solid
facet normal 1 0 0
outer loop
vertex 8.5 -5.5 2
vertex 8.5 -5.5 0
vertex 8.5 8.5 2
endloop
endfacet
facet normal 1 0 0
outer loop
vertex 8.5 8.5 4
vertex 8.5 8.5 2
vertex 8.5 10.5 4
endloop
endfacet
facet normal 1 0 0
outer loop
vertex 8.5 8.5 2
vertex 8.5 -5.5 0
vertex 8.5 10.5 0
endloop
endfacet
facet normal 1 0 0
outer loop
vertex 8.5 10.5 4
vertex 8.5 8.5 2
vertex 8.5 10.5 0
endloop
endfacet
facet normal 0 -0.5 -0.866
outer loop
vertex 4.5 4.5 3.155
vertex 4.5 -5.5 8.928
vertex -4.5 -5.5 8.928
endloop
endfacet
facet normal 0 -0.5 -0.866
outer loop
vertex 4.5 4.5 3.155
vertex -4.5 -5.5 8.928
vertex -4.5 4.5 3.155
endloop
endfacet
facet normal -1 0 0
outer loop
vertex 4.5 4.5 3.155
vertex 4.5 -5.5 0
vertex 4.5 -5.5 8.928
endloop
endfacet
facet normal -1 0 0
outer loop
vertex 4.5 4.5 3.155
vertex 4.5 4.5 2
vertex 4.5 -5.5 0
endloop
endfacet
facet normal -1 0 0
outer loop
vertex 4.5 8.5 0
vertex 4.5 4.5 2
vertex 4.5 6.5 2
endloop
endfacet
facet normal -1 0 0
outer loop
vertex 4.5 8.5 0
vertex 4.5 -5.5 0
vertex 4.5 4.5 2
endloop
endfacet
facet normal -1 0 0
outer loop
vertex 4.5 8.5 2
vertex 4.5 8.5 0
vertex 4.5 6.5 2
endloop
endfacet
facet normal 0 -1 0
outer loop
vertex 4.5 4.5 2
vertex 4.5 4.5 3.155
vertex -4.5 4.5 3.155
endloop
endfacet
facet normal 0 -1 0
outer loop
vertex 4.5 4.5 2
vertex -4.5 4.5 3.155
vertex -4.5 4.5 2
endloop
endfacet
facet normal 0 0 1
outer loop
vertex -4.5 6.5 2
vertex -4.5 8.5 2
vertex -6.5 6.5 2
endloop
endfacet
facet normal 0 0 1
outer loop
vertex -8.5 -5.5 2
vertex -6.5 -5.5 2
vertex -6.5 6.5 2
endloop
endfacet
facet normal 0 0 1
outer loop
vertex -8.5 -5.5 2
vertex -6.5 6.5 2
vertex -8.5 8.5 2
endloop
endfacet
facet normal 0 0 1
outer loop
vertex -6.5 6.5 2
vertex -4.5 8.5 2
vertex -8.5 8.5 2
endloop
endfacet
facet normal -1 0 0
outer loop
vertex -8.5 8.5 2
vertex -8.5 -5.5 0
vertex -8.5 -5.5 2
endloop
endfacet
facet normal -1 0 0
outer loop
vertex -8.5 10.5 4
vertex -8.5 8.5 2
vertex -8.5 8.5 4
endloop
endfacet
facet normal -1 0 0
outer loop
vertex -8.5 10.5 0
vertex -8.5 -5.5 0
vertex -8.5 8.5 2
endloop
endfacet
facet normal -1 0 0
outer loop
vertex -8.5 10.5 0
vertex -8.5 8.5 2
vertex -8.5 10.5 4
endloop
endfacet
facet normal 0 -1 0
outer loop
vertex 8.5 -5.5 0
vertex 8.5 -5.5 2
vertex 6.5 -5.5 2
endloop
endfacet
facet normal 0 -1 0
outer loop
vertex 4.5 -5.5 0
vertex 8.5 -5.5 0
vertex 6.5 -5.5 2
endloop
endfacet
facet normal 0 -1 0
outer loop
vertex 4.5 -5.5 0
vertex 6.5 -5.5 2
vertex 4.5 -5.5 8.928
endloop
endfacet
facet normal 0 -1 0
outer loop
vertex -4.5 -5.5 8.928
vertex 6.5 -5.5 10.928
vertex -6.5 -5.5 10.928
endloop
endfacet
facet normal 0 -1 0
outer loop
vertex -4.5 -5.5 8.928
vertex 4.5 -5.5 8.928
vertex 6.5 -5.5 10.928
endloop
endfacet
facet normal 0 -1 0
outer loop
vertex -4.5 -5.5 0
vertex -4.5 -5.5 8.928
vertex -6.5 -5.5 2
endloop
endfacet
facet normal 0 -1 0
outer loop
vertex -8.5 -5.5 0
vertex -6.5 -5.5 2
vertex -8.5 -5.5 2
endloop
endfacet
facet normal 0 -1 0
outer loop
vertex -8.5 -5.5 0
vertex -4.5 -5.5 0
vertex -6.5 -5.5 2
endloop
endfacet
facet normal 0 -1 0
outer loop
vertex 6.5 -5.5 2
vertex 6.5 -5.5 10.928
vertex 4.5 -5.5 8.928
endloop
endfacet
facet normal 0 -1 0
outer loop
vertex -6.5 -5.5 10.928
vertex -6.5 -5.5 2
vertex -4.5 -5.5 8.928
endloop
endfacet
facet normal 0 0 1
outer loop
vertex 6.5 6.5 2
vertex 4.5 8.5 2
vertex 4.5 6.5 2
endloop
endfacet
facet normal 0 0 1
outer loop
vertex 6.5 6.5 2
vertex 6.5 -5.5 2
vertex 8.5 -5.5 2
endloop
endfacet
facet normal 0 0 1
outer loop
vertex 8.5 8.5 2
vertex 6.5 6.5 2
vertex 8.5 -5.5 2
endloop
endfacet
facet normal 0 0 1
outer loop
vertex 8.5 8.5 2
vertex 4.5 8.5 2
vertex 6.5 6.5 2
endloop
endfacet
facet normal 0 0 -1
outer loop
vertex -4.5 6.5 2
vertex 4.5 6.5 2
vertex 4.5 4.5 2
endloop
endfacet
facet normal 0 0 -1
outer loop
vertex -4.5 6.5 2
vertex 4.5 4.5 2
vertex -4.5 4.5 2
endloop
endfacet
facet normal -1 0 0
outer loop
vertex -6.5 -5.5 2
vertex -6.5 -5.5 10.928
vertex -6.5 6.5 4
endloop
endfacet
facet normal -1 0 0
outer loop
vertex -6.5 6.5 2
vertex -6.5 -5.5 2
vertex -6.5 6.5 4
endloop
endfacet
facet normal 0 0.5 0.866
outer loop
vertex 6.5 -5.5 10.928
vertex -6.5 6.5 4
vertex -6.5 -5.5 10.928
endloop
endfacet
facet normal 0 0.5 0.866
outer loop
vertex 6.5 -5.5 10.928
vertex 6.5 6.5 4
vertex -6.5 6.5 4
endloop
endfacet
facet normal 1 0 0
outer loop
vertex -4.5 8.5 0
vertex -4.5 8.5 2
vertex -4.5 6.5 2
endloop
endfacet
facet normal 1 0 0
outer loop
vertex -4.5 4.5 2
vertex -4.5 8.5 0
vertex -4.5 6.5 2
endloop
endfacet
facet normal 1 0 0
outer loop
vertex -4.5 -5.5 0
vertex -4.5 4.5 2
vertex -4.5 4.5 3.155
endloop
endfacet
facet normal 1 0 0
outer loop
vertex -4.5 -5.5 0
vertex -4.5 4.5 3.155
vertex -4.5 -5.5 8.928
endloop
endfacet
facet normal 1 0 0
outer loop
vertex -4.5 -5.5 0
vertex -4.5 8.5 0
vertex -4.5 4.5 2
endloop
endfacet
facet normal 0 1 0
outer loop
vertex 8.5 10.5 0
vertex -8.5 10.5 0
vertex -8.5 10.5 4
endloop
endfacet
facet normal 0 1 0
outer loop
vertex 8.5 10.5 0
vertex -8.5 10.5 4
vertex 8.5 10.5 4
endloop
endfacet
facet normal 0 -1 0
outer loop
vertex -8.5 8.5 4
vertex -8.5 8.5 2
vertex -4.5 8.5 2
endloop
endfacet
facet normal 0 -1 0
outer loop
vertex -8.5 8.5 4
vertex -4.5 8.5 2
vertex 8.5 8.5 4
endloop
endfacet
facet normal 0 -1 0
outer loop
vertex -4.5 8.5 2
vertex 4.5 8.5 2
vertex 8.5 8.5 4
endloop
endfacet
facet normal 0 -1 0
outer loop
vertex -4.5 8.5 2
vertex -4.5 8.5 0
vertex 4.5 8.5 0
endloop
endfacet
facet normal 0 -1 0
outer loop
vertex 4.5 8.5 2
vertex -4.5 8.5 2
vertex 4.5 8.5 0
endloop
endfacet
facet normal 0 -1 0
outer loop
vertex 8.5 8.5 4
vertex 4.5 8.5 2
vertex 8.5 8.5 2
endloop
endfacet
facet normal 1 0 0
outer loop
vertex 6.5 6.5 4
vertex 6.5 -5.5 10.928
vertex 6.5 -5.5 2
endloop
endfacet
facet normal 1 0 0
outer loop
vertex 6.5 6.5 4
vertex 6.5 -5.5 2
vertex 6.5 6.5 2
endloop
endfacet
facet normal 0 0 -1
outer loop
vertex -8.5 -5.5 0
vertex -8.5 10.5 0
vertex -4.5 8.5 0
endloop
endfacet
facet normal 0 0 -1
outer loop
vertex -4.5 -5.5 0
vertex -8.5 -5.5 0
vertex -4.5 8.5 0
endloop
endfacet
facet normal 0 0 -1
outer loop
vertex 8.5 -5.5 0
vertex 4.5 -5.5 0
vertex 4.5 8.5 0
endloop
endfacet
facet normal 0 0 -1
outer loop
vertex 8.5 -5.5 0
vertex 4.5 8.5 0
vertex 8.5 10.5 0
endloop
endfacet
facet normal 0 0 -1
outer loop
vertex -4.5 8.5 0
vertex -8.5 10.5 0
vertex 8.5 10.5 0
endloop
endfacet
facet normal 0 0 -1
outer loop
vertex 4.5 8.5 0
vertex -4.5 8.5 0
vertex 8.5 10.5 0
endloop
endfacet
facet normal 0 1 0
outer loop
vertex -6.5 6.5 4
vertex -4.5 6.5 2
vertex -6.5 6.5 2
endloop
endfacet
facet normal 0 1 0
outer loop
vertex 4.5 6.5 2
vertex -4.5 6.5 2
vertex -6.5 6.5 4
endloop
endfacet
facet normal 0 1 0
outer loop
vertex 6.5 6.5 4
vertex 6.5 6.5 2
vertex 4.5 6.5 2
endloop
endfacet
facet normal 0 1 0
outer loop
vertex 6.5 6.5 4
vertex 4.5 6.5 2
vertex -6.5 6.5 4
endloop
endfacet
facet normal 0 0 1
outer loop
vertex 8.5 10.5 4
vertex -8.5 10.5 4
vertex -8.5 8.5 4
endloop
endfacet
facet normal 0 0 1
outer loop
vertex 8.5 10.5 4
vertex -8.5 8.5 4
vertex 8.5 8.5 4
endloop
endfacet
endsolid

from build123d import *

# Parameters (mm, degrees)
F4_DEPTH  = 9
F6_DEPTH  = 2
F8_DEPTH  = 2
F9_W      = 9
F9_H      = 2
F10_DEPTH = 2
F11_W     = 17
F11_H     = 2
F12_DEPTH = 4


# Not quite as in the source:
# - a pattern or mirror of a feature is missing from the dataset's text; its kind, count and spacing are read off the source's solid


with BuildPart() as f4:
    # F3 (on plane+point) → F4 (new body, through all)
    with BuildSketch(Plane.YZ.offset(4.5)):
        Polygon((4.5, 0), (6.5, 0), (6.5, 4), (-5.5, 10.9282032303), (-5.5, 8.9282032303), (4.5, 3.1547005384), align=None)
    extrude(amount=-F4_DEPTH)

    # F5 (on face) → F6 (join)
    with BuildSketch(Plane.YZ.offset(4.5)):
        Polygon((6.5, 4), (-5.5, 10.9282032303), (-5.5, 0), (6.5, 0), align=None)
    f6 = extrude(amount=F6_DEPTH)

    # F6_copies: F6 across plane
    add(f6.mirror(Plane(origin=(0, 0, 0), x_dir=(0, 0, -1), z_dir=(-1, 0, 0))))

    # F7 (on Top) → F8 (join)
    with BuildSketch(Plane.XY):
        Polygon((4.5, 8.5), (4.5, 6.5), (6.5, 6.5), (6.5, -5.5), (8.5, -5.5), (8.5, 8.5), align=None)
    f8 = extrude(amount=F8_DEPTH)

    # F8_copies: F8 across plane
    add(f8.mirror(Plane(origin=(0, 0, 0), x_dir=(0, 0, -1), z_dir=(-1, 0, 0))))

    # F9 (on face) → F10 (cut, through all)
    with BuildSketch(Plane(origin=(0, 6.5, 0), x_dir=(-1, 0, 0), z_dir=(0, 1, 0))):
        with Locations((0, 1)):
            Rectangle(F9_W, F9_H)
    extrude(amount=-F10_DEPTH, mode=Mode.SUBTRACT)

    # F11 (on Top) → F12 (join)
    with BuildSketch(Plane.XY):
        with Locations((0, 9.5)):
            Rectangle(F11_W, F11_H)
    extrude(amount=F12_DEPTH)


solid = f4.part
